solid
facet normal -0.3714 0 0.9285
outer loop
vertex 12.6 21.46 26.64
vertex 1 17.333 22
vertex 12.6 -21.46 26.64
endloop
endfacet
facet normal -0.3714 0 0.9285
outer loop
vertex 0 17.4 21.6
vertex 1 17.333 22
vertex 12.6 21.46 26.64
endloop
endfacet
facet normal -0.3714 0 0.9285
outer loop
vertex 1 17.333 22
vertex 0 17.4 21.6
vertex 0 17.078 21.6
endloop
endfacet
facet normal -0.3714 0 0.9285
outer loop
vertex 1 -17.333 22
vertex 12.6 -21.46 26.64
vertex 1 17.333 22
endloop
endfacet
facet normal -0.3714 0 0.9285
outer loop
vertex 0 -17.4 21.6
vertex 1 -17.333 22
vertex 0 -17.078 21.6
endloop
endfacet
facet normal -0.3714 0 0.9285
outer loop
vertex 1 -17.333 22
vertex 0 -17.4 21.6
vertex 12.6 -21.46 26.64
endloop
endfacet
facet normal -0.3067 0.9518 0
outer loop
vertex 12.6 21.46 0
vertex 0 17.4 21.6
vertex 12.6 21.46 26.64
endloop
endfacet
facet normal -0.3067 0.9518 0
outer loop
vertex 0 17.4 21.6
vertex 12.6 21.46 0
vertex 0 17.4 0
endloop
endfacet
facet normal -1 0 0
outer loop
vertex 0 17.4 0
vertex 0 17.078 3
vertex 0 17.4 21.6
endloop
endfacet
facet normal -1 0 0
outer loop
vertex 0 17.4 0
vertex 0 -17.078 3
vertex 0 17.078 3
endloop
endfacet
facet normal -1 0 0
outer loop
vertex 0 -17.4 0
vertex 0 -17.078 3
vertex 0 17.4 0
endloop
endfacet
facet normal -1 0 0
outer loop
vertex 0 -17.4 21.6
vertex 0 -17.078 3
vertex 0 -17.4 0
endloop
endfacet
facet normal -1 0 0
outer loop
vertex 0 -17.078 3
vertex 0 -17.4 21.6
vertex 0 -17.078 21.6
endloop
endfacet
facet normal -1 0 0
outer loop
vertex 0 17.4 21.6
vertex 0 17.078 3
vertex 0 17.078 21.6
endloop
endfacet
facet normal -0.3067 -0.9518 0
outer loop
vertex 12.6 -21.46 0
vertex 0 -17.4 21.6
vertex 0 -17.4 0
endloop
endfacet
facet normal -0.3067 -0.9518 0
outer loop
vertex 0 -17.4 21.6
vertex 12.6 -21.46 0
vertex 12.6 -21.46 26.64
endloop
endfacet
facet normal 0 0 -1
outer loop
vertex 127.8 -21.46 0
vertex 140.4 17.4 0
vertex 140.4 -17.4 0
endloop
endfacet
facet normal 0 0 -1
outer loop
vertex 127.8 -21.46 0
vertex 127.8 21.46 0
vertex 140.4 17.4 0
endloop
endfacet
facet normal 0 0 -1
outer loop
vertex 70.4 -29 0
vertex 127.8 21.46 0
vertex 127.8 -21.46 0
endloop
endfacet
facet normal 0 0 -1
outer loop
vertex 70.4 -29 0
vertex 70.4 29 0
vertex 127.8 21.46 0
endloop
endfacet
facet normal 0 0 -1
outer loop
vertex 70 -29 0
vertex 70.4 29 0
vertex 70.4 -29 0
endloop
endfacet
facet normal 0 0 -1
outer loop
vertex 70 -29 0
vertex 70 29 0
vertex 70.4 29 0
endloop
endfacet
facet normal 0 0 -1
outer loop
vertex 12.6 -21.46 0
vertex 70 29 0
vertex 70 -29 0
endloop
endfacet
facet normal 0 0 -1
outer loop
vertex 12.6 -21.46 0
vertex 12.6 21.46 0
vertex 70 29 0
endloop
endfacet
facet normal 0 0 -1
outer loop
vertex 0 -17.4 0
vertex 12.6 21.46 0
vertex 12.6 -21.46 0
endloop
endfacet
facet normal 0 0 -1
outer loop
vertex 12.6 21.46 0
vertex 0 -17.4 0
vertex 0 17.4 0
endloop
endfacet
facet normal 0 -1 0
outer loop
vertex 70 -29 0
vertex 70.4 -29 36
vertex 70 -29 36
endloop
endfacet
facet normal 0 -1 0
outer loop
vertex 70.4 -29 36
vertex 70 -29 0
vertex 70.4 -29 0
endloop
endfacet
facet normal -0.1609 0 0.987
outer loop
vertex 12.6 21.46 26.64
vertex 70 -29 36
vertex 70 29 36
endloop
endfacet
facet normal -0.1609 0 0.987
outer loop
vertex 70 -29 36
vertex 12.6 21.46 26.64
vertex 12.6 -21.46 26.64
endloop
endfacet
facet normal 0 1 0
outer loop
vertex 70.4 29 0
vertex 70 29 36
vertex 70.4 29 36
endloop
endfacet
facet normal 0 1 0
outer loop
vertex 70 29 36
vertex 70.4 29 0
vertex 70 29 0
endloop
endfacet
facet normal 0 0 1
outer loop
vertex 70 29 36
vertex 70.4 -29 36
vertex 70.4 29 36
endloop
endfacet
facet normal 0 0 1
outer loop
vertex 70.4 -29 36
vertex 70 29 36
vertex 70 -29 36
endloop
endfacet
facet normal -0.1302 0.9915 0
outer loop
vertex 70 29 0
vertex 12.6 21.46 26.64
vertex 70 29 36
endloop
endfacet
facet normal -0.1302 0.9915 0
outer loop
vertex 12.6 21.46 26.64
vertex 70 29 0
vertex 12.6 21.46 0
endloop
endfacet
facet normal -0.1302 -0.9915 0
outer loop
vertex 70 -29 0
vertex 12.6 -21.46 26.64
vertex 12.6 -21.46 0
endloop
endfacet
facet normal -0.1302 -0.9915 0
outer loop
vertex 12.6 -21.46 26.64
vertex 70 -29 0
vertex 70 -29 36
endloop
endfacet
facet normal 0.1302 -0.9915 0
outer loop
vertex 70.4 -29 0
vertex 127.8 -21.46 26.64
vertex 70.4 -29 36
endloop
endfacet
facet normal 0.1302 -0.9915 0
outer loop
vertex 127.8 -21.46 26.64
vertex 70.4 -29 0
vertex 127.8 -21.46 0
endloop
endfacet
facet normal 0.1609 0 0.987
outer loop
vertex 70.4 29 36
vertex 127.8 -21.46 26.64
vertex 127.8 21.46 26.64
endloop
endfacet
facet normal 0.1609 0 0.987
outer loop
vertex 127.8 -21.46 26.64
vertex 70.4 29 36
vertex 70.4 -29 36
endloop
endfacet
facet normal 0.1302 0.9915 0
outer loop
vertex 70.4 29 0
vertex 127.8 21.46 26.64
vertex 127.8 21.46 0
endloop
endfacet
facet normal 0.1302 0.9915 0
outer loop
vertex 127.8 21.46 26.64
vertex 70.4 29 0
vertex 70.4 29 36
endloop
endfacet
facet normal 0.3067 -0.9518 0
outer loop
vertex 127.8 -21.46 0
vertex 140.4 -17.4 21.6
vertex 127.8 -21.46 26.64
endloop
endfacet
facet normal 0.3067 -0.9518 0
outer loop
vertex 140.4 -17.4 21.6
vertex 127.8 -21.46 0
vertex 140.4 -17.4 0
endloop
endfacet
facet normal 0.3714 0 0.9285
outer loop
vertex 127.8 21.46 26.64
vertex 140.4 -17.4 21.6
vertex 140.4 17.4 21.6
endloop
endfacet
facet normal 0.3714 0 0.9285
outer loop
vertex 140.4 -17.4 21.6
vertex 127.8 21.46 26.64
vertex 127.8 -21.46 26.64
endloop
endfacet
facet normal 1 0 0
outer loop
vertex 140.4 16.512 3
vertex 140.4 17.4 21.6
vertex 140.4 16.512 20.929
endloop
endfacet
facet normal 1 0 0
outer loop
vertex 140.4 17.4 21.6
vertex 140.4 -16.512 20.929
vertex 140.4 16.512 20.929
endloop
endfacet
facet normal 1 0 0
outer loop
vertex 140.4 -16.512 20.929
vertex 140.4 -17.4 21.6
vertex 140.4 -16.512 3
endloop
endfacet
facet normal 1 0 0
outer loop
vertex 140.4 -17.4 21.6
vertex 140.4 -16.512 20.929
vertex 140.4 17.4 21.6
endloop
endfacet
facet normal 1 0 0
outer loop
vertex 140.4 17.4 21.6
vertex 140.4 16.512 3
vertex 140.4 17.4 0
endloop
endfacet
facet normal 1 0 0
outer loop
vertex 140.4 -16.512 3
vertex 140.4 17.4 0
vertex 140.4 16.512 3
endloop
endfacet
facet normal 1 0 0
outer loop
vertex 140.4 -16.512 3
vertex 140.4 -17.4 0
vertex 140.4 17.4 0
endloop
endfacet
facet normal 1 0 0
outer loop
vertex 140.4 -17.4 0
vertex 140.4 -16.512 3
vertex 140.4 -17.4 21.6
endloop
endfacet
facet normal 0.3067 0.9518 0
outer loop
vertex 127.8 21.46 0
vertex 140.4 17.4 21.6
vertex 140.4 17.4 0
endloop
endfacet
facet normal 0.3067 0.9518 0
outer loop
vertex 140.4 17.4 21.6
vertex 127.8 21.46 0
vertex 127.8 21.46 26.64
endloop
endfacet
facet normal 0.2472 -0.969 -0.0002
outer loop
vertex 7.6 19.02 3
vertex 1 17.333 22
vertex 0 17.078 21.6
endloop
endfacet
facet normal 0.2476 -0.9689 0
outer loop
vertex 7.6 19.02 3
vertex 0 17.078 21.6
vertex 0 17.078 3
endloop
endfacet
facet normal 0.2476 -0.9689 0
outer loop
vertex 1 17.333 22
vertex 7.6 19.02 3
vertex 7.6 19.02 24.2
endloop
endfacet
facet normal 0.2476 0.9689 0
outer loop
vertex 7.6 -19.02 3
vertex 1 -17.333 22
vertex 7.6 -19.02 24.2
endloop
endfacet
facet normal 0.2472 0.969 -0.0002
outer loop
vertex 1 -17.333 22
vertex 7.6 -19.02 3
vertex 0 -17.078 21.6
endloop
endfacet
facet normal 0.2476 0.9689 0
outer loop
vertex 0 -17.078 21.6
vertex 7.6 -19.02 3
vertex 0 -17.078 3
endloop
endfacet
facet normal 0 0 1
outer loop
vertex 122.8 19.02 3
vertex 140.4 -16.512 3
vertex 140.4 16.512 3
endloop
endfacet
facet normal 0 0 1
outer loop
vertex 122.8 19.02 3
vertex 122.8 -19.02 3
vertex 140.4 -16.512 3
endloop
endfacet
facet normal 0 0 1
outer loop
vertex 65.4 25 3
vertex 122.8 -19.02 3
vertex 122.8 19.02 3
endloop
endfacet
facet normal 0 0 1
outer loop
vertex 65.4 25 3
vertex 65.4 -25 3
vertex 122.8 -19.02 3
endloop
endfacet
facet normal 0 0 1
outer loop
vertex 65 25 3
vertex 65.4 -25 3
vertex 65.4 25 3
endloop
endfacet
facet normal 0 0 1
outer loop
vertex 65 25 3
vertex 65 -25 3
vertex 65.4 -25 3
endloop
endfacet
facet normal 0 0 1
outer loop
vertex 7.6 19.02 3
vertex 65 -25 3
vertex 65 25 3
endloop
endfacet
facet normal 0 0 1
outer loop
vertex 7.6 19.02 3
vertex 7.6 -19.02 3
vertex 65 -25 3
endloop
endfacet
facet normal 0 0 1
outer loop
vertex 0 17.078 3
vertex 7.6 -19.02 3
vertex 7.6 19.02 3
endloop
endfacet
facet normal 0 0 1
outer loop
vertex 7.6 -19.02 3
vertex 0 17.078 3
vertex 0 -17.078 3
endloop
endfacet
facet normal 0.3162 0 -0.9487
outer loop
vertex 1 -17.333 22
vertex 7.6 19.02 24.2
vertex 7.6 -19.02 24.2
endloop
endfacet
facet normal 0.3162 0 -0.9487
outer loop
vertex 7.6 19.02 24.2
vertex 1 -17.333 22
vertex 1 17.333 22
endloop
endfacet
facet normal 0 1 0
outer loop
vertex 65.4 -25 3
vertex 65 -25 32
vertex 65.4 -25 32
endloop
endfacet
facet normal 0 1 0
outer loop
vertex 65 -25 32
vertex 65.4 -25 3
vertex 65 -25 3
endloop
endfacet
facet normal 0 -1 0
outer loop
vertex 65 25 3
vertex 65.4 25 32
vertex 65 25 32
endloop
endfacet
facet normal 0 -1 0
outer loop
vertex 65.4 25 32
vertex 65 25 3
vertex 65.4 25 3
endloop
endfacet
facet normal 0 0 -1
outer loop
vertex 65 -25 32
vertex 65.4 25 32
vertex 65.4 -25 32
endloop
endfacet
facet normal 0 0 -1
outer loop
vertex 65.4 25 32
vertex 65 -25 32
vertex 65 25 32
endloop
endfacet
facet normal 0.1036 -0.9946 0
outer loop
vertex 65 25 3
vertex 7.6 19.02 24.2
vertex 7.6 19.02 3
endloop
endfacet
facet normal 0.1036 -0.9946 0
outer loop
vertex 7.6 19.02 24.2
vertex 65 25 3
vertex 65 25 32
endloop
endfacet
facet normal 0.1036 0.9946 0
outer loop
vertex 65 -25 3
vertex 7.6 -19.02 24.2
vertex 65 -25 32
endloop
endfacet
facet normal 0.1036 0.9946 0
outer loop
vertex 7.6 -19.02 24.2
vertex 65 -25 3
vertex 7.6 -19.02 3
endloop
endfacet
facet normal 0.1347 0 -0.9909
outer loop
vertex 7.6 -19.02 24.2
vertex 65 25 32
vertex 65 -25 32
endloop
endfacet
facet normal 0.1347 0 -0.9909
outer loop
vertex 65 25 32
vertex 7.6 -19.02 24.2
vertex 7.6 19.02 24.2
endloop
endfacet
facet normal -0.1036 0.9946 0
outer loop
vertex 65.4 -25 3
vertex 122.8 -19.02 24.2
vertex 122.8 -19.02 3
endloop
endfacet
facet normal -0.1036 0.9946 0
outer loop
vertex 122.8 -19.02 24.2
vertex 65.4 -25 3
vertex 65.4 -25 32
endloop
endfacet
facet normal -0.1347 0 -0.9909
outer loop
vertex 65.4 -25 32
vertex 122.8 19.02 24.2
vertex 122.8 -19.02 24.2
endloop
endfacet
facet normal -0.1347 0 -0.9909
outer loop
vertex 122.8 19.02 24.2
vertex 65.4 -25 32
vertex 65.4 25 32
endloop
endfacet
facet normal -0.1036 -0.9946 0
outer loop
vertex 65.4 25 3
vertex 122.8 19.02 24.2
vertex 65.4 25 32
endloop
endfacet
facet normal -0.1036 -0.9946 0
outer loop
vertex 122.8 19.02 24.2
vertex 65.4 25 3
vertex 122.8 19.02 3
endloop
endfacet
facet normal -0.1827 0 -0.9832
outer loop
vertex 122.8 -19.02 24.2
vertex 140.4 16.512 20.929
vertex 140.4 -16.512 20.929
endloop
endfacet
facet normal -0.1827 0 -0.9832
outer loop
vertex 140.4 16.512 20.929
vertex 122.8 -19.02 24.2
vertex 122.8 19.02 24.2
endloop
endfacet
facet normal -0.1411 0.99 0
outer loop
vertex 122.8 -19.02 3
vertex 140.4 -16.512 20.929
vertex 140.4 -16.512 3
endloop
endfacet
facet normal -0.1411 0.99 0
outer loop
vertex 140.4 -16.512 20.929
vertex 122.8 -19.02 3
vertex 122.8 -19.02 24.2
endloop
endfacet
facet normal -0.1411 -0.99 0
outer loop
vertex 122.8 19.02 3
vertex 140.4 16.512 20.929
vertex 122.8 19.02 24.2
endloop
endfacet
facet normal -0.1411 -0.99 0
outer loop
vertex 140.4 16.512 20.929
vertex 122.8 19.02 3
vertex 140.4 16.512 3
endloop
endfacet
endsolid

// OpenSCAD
$fn = 32;

// ----------------------------------------------------------------------
// Faired channel: 140 x 58 x 36 mm, 4 mm walls, faired ends
// ----------------------------------------------------------------------

// --- parameters (mm) ---
length = 140;             // channel length
width = 58;               // channel width at mid length
height = 36;              // channel height at mid length
wall = 4;                 // side wall thickness
floor_t = 3;              // floor thickness
end_w = 34.8;             // faired end width
end_h = 21.6;             // faired end height

difference() {
  union() {
    hull() {
      translate([0, -17.4, 0]) cube([0.4, 34.8, 21.6]);
      translate([12.6, -21.46, 0]) cube([0.4, 42.92, 26.64]);
    }
    hull() {
      translate([12.6, -21.46, 0]) cube([0.4, 42.92, 26.64]);
      translate([70, -29, 0]) cube([0.4, 58, 36]);
    }
    hull() {
      translate([70, -29, 0]) cube([0.4, 58, 36]);
      translate([127.4, -21.46, 0]) cube([0.4, 42.92, 26.64]);
    }
    hull() {
      translate([127.4, -21.46, 0]) cube([0.4, 42.92, 26.64]);
      translate([140, -17.4, 0]) cube([0.4, 34.8, 21.6]);
    }
  }
  /* cavity, 5 mm proud of both ends so the ports are cut clean */
  hull() {
    translate([-5, -15.8, 3]) cube([0.4, 31.6, 17]);
    translate([7.6, -19.02, 3]) cube([0.4, 38.04, 21.2]);
  }
  hull() {
    translate([7.6, -19.02, 3]) cube([0.4, 38.04, 21.2]);
    translate([65, -25, 3]) cube([0.4, 50, 29]);
  }
  hull() {
    translate([65, -25, 3]) cube([0.4, 50, 29]);
    translate([122.4, -19.02, 3]) cube([0.4, 38.04, 21.2]);
  }
  hull() {
    translate([122.4, -19.02, 3]) cube([0.4, 38.04, 21.2]);
    translate([145, -15.8, 3]) cube([0.4, 31.6, 17]);
  }
}
